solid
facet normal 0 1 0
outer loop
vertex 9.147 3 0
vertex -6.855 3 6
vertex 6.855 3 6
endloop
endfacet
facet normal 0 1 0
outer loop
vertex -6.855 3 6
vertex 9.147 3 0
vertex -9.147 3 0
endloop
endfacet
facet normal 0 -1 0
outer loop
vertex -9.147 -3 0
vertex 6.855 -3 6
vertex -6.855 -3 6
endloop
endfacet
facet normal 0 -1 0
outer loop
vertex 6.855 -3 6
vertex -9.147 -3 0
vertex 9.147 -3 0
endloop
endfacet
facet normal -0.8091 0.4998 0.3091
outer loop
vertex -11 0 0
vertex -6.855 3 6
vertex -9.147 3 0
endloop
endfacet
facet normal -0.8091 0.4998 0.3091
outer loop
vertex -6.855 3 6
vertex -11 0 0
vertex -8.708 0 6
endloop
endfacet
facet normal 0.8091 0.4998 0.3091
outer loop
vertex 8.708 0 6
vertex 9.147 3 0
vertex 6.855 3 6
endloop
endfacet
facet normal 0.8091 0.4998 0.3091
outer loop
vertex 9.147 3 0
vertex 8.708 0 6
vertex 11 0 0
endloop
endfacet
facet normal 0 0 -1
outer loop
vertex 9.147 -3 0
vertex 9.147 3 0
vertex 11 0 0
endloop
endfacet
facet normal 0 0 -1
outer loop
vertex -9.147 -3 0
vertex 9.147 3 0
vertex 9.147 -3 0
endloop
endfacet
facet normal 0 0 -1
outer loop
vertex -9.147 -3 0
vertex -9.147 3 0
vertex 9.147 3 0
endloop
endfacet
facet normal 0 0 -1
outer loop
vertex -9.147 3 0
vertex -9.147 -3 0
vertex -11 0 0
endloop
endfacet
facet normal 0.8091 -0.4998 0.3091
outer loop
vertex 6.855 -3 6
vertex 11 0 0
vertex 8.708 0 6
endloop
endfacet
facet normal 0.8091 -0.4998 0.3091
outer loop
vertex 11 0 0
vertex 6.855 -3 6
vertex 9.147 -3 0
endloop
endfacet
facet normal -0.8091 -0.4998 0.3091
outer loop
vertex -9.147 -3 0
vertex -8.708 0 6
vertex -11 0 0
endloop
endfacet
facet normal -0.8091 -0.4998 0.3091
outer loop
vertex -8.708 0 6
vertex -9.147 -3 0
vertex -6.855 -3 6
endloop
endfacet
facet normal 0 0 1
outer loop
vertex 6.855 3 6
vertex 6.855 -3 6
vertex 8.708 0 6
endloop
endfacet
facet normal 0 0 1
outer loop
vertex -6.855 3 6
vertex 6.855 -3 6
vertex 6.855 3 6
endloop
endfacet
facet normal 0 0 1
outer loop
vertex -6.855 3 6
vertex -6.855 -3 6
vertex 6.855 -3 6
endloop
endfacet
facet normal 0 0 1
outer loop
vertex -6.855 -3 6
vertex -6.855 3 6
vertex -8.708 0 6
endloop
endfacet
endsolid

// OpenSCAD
// die penti strebe wird aus einer pyramide geschnitten
// d.h. von der pyrmide werden drei platten abgezogen
// die pyramide konstruiert sich aus den gegebenen winkeln
// die platten berechnen sich aus den dimensionen der streben

// Lenght of outer edge
leng = 22; // [1:100]
// Width of beam
widt = 6; // [1:10]
// Height of beam
heig = 6; // [1:10]

module strebe (leng, widt, heig) {
    // platten(widt, leng);
    difference() {
        pyra(leng);
        platten(widt, leng);
        deckel(heig, leng);
    }
}

module pyra(leng) { // leng ist f
    // https://www.matheretter.de/rechner/raute/
    // alpha ist 116.6
    // ergibt ein e von 161.91 bei einem f von 100
    otherleng = leng * 1.6191;
    // dreieck mit seitenwinkeln 69.1 gibt spitzwinkel von 41.8
    // grundlinie 100 --> hoehe von 130.9
    heiglen = leng * 1.309;
    points = [
        [ leng/2, 0, 0 ], // A 0
        [ leng, otherleng/2, 0 ], // B 1
        [ leng/2, otherleng, 0 ], // C 2
        [ 0, otherleng/2, 0 ], // D 3
        [ leng/2, otherleng/2, heiglen ] // E 4
    ];
    faces = [
        [1,2,3], // boden N
        [1,3,0], // boden S
        [2,4,3], // N
        [1,4,2], // O
        [0,4,1], // S
        [0,3,4] // W
    ];
    translate([-leng/2,-otherleng/2,0])
        polyhedron(points, faces, 1);
    
}

module platten(widt, leng) {
   translate([-leng/2, widt/2, -1])
       cube([leng, leng, leng]);
    rotate(180)
    translate([-leng/2, widt/2, -1])
       cube([leng, leng, leng]);
}

module deckel(heig, leng) {
    translate([-leng/2, -leng/2, heig])
       cube([leng, leng, leng*2]);
}

strebe(leng, widt, heig);
